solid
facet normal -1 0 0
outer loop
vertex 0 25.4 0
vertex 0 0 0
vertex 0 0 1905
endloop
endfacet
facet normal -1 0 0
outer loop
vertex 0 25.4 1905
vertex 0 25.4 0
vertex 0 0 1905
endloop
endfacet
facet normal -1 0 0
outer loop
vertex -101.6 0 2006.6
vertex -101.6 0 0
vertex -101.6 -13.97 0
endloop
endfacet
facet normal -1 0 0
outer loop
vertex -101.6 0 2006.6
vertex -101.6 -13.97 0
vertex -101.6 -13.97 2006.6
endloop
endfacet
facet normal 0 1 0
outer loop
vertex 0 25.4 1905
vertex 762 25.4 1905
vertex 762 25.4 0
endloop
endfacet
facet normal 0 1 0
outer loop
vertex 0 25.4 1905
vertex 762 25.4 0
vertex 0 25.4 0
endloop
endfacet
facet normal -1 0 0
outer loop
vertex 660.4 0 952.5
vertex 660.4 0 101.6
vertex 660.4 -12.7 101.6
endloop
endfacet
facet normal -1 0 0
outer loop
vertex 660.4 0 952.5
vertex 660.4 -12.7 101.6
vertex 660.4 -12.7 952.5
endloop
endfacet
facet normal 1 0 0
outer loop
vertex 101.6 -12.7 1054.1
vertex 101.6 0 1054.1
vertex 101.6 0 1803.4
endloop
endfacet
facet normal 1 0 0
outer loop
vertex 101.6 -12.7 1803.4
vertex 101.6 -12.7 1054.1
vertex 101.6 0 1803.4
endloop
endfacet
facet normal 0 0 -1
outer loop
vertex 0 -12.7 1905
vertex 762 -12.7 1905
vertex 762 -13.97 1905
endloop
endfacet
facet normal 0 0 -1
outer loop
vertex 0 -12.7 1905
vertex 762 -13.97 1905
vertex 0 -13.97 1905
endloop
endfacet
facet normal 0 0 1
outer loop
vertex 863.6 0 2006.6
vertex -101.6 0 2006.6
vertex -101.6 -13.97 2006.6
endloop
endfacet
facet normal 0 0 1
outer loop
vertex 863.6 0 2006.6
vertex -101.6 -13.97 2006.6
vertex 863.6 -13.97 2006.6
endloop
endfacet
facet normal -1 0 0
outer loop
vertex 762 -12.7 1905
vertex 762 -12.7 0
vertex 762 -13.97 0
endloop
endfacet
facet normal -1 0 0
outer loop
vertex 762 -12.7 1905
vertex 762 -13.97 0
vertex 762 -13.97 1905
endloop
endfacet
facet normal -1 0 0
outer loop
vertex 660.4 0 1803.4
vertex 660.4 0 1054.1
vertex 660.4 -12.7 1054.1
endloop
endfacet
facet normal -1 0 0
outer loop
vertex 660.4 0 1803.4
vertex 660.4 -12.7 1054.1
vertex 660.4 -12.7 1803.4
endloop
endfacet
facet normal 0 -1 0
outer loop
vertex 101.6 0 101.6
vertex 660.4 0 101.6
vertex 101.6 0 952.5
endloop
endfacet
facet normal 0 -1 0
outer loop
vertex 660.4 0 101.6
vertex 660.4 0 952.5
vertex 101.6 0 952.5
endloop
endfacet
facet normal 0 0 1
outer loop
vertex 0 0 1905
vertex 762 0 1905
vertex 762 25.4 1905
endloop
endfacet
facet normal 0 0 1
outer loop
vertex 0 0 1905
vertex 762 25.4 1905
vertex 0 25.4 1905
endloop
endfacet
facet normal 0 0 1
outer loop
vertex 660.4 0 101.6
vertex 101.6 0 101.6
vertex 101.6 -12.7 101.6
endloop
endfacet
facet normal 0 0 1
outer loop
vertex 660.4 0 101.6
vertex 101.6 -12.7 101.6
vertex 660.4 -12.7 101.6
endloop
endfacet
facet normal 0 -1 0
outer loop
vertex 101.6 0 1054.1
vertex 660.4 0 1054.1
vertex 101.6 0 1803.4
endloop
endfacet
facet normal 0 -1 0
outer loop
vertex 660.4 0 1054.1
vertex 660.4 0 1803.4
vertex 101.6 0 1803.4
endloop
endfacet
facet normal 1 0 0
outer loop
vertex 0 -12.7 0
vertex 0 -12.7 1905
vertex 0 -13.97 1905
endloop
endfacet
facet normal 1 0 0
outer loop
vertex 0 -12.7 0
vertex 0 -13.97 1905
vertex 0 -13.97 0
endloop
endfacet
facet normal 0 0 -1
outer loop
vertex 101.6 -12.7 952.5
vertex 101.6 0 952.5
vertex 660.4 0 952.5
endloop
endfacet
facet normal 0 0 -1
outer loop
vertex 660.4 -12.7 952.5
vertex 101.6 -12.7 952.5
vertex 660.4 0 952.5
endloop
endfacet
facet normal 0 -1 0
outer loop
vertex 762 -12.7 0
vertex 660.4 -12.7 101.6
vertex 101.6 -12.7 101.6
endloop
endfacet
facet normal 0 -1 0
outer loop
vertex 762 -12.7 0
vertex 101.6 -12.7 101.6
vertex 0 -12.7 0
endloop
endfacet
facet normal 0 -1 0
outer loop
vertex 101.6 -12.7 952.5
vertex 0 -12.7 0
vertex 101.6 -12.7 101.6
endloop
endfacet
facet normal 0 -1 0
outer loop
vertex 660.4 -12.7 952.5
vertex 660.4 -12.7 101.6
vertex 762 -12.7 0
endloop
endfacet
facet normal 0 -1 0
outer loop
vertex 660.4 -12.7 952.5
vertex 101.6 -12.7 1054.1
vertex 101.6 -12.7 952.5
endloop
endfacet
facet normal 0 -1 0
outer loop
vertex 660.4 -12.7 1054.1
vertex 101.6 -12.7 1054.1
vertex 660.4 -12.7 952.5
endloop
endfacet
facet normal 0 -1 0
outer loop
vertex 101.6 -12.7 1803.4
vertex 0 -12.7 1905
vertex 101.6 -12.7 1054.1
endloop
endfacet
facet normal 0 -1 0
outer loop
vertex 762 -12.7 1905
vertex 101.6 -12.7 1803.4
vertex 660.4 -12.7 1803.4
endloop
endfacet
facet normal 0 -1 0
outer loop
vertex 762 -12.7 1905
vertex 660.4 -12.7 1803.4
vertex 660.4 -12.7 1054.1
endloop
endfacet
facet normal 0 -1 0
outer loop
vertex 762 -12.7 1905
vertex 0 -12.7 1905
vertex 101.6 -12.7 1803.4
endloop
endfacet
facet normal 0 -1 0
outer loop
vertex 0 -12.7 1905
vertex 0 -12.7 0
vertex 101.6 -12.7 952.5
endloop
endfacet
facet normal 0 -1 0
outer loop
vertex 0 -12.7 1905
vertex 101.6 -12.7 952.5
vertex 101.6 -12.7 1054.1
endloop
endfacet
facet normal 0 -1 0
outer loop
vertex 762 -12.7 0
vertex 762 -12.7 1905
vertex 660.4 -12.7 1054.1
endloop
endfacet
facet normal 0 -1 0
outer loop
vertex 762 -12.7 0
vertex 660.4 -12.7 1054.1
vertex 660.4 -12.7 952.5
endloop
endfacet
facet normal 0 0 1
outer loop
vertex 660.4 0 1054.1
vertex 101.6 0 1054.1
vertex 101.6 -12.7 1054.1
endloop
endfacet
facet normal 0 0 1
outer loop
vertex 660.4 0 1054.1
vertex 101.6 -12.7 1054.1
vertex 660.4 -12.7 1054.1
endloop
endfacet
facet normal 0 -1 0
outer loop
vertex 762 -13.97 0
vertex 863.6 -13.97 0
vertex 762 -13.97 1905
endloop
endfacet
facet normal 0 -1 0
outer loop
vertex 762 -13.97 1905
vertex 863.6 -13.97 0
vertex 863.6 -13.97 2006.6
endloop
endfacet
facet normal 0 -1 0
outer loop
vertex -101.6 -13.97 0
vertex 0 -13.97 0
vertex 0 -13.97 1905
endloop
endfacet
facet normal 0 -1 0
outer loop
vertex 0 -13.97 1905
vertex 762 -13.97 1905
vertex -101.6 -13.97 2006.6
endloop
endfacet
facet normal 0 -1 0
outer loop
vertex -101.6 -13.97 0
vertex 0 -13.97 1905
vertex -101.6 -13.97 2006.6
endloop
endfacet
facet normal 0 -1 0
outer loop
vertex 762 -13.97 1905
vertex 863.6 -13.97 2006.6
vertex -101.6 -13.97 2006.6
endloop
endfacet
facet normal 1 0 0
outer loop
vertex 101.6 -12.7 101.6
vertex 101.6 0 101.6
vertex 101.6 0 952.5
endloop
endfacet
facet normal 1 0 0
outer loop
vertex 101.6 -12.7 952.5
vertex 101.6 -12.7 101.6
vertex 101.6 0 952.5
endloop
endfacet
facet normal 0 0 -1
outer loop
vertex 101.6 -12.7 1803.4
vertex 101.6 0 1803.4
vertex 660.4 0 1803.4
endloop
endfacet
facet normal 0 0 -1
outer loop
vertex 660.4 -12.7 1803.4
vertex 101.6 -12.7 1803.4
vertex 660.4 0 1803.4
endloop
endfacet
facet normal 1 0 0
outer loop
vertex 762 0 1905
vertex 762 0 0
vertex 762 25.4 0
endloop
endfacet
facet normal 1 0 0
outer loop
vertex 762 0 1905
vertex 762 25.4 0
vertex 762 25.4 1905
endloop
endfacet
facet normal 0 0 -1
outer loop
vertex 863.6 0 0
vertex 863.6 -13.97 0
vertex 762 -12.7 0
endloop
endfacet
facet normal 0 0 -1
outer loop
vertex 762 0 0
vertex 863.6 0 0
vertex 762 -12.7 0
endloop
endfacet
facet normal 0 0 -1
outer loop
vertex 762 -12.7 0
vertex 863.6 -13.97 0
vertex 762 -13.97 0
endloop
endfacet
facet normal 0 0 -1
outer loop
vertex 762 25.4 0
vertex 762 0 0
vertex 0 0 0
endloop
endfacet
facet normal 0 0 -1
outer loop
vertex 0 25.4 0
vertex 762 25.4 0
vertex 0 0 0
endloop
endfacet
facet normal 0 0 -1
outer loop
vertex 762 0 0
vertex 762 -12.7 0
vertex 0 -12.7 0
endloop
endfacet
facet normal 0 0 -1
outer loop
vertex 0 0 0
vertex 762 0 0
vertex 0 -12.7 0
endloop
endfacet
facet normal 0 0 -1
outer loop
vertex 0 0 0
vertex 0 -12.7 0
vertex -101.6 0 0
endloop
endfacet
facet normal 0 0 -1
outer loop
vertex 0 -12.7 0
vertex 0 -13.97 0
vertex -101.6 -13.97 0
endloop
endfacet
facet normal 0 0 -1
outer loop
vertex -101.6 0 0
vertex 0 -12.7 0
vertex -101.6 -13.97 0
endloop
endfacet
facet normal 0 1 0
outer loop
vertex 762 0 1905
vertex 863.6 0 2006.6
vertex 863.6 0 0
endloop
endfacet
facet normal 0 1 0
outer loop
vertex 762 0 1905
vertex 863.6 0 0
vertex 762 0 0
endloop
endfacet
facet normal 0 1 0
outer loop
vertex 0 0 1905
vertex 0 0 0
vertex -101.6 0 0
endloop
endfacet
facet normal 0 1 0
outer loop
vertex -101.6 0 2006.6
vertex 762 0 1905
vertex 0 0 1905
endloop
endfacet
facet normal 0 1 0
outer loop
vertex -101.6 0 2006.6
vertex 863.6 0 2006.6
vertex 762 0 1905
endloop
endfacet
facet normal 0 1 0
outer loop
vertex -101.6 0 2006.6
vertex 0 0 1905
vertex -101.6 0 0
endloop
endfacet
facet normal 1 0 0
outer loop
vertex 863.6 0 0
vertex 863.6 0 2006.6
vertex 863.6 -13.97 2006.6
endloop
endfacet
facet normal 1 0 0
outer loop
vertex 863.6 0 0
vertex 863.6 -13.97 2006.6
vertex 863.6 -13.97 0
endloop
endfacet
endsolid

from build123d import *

# Parameters (mm, degrees)
F0_W     = 762
F0_H     = 1905
F0_W_2   = 558.8
F0_H_2   = 850.9
F0_H_3   = 749.3
F1_DEPTH = 12.7
F3_DEPTH = 13.97
F4_W     = 762
F4_H     = 1905
F5_DEPTH = 25.4


with BuildPart() as f1:
    # F0 (on Front) → F1 (new body)
    with BuildSketch(Plane.XZ):
        with Locations((381, 952.5)):
            Rectangle(F0_W, F0_H)
        with Locations((381, 527.05)):
            Rectangle(F0_W_2, F0_H_2, mode=Mode.SUBTRACT)
        with Locations((381, 1428.75)):
            Rectangle(F0_W_2, F0_H_3, mode=Mode.SUBTRACT)
    extrude(amount=F1_DEPTH)

    # F2 (on face) → F3 (join)
    with BuildSketch(Plane(origin=(0, 0, 0), x_dir=(-1, 0, 0), z_dir=(0, 1, 0))):
        Polygon((0, 1905), (0, 0), (101.6, 0), (101.6, 2006.6), (-863.6, 2006.6), (-863.6, 0), (-762, 0), (-762, 1905), align=None)
    extrude(amount=-F3_DEPTH)

    # F4 (on face) → F5 (join)
    with BuildSketch(Plane(origin=(0, 0, 0), x_dir=(-1, 0, 0), z_dir=(0, 1, 0))):
        with Locations((-381, 952.5)):
            Rectangle(F4_W, F4_H)
    extrude(amount=F5_DEPTH)


solid = f1.part
